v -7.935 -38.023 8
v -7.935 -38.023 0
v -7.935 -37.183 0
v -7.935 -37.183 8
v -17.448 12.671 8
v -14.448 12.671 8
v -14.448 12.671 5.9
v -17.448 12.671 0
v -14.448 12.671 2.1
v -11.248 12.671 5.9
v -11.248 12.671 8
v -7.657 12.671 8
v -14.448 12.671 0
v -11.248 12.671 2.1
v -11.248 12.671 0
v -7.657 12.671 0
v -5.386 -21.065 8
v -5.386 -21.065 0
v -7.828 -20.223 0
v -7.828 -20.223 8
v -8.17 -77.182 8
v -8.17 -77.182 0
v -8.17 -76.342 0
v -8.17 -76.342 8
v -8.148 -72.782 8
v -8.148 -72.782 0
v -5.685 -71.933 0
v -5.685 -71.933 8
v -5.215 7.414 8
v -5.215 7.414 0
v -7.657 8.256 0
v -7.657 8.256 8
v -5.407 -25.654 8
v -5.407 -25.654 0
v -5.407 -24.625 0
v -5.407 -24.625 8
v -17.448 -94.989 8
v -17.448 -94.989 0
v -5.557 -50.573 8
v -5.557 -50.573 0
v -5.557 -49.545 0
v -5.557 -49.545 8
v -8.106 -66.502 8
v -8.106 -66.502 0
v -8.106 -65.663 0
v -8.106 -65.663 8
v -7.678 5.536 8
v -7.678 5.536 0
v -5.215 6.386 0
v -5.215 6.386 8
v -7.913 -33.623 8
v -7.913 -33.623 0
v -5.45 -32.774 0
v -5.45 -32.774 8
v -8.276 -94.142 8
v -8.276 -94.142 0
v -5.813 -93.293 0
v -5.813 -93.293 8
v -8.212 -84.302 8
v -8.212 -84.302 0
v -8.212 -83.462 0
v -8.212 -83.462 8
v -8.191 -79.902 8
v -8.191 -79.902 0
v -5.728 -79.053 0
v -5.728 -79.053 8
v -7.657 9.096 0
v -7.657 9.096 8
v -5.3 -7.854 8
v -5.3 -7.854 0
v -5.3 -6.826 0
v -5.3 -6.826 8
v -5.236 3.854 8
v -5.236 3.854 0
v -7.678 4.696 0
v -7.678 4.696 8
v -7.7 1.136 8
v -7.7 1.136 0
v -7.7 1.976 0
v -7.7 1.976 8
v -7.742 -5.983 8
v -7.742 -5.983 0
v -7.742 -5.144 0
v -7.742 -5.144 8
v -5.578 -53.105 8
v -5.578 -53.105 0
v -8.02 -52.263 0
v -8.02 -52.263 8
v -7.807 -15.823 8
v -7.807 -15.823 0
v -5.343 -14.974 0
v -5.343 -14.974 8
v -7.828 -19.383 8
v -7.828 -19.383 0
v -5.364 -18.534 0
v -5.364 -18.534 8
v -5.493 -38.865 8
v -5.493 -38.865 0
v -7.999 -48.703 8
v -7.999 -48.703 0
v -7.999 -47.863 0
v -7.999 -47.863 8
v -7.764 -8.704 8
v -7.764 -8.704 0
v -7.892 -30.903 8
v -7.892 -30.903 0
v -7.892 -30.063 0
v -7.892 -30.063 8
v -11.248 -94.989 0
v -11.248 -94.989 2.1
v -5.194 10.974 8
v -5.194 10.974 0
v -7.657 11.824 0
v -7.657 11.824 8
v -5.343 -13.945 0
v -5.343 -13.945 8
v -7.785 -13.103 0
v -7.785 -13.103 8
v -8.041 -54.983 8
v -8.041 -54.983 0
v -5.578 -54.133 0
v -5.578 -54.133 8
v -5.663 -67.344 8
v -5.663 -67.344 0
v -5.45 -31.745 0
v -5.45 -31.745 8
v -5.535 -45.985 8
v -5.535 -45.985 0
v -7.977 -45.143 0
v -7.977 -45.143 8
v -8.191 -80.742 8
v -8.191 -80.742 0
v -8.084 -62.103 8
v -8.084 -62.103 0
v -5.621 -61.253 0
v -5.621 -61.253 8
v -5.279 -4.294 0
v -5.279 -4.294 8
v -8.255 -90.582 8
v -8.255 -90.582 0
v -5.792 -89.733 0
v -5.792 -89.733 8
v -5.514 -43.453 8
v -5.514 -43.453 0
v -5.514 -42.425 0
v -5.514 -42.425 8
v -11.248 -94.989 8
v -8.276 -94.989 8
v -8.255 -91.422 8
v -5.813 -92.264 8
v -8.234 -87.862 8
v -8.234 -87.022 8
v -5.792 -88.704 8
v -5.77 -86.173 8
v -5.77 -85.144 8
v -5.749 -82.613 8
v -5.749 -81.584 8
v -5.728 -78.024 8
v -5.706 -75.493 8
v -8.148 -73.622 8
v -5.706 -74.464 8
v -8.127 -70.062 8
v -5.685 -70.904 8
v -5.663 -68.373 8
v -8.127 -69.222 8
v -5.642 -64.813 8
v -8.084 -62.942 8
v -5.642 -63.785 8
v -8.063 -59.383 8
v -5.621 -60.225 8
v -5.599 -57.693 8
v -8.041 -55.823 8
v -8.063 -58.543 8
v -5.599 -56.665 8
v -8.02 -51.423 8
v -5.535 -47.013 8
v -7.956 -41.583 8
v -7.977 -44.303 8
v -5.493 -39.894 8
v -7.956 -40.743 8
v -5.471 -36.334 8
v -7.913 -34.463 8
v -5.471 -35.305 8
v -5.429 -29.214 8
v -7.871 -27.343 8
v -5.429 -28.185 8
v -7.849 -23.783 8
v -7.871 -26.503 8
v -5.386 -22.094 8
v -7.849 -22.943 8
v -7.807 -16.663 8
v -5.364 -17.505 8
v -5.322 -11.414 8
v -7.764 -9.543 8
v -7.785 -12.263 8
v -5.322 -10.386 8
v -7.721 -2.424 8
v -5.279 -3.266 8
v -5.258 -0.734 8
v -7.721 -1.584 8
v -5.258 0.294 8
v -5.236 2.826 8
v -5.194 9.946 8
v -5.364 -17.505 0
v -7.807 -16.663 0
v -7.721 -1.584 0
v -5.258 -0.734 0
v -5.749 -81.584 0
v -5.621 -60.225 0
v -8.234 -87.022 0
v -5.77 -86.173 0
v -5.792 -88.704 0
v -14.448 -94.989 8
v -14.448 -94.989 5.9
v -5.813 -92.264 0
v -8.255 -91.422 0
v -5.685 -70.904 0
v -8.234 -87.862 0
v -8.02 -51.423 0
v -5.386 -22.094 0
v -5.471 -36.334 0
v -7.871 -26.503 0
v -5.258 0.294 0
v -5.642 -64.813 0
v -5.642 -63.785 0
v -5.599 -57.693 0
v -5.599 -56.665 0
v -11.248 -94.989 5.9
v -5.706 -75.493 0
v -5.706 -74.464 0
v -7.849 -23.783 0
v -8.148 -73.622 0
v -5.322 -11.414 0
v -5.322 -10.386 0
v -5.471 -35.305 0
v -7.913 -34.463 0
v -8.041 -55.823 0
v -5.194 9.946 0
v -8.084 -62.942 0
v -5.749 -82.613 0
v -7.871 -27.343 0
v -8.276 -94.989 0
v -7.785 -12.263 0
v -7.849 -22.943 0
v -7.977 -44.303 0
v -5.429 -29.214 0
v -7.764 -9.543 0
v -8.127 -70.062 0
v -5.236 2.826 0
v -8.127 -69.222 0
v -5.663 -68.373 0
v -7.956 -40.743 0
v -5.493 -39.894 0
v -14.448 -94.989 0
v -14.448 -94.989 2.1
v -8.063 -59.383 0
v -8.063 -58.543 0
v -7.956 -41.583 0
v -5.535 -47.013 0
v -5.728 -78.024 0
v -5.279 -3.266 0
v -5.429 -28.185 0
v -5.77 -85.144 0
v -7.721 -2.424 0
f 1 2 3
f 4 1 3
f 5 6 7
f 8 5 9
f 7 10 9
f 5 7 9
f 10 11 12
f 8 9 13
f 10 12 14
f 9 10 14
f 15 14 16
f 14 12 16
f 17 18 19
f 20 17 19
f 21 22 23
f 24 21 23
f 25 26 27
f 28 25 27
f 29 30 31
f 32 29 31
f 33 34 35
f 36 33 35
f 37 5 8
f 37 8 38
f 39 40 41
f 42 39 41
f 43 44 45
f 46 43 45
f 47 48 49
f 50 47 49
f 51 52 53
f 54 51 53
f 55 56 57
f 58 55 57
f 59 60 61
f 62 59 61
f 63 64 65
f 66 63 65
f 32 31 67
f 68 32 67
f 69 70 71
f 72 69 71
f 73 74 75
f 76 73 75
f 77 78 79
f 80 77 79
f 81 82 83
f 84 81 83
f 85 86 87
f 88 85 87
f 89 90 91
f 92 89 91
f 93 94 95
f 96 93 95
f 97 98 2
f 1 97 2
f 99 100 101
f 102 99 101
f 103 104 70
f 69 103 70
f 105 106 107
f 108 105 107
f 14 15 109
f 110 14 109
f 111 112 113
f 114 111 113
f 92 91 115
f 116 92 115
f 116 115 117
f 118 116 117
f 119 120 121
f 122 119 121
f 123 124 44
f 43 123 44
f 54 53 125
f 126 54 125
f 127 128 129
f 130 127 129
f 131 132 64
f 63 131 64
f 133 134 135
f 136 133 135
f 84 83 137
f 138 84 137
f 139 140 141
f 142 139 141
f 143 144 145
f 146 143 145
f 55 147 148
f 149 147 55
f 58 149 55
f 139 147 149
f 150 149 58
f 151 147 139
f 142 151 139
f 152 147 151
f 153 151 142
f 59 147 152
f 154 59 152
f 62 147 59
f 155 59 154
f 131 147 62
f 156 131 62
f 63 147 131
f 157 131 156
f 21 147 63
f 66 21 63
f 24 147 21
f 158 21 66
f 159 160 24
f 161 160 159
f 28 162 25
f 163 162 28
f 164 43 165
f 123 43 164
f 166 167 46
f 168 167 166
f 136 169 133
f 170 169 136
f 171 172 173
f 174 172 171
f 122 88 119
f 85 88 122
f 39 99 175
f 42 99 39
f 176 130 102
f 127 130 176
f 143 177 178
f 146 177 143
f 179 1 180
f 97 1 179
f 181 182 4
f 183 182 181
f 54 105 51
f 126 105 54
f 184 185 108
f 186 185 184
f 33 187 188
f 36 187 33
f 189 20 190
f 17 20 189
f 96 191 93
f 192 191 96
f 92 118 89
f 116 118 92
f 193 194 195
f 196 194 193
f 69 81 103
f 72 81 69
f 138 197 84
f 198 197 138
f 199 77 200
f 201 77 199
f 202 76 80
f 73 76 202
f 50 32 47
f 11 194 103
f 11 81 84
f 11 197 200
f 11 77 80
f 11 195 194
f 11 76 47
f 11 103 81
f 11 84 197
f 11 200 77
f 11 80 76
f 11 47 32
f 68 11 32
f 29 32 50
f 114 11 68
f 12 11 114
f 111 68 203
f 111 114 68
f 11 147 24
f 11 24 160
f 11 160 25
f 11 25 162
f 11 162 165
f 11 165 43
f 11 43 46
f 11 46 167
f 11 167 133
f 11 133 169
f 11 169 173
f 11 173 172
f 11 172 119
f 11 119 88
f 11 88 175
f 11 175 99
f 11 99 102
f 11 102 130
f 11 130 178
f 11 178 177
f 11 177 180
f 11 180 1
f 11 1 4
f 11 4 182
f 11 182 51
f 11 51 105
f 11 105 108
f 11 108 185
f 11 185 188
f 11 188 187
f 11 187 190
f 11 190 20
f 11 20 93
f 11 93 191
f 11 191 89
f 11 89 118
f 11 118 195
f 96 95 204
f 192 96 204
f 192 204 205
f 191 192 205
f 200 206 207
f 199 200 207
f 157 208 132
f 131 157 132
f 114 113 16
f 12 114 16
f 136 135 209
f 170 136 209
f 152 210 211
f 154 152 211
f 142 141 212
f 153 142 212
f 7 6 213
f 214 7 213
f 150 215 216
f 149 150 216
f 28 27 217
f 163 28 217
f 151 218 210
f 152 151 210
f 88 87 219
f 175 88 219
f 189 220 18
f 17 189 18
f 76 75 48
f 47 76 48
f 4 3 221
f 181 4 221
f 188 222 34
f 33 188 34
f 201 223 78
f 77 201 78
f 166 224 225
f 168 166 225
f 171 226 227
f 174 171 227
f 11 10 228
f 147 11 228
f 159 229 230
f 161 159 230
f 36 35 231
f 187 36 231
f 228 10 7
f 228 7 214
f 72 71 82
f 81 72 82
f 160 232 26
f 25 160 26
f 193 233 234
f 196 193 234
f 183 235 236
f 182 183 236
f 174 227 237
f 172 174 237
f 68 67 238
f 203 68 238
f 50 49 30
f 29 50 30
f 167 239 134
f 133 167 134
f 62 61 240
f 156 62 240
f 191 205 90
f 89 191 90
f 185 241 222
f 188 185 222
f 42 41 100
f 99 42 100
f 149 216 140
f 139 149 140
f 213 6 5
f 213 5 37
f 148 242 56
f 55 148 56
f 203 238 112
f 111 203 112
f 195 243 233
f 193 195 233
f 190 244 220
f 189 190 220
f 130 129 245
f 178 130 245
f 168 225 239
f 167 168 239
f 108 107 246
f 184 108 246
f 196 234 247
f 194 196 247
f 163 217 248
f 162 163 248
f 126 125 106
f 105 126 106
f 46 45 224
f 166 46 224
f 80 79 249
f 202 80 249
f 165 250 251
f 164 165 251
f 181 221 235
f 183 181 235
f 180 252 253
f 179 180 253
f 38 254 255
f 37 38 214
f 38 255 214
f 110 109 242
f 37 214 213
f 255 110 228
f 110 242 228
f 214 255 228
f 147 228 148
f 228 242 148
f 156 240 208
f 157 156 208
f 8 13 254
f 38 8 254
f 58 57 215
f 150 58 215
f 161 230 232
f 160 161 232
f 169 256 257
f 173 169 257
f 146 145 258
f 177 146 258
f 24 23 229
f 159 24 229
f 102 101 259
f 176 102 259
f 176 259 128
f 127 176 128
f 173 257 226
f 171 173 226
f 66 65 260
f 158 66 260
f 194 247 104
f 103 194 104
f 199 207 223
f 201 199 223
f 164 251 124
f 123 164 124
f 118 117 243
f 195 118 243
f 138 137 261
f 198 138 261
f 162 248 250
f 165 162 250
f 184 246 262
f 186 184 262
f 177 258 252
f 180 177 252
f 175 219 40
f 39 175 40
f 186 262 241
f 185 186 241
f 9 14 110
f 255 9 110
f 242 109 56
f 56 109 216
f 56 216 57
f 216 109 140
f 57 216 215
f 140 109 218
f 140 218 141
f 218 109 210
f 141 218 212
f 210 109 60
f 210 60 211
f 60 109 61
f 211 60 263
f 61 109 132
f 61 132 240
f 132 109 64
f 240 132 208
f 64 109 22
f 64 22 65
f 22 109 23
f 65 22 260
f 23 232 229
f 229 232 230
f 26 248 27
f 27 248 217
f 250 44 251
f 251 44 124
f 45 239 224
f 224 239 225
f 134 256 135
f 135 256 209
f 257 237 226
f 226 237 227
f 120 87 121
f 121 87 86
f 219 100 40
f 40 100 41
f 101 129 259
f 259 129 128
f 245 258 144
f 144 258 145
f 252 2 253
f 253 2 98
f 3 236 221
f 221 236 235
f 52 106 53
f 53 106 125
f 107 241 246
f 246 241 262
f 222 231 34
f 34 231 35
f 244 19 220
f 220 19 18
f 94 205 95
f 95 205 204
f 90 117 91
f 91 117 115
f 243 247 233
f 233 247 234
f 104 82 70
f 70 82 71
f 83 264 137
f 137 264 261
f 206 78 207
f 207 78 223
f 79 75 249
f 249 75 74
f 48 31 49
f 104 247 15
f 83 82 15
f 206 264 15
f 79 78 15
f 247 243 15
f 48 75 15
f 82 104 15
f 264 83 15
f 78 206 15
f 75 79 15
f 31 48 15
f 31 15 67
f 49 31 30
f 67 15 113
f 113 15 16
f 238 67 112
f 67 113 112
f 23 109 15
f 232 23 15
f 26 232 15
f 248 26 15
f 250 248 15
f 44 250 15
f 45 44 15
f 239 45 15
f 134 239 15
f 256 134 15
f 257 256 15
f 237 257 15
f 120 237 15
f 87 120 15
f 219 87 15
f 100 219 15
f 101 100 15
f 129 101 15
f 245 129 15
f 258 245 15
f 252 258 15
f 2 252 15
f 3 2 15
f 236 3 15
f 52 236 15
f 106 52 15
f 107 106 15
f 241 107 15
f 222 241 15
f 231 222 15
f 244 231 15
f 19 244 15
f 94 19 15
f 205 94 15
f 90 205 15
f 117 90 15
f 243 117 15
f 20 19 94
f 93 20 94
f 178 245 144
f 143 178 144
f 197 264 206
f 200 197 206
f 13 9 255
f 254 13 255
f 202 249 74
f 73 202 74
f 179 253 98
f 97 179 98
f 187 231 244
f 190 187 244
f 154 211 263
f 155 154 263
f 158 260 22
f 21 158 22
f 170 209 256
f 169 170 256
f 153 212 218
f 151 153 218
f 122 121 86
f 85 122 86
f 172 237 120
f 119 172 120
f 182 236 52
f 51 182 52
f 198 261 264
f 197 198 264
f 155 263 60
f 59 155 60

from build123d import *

# Parameters (mm, degrees)
F1_DEPTH = 8
F2_W     = 107.659508
F2_H     = 3.8
F3_DEPTH = 3.2
F4_W     = 107.659508
F4_H     = 2.1
F4_H_2   = 3.8
F5_DEPTH = 3


with BuildPart() as f1:
    # F0 (on Top) → F1 (new body)
    with BuildSketch(Plane.XY):
        Polygon((-7.657052, 11.823565), (-7.657052, 12.67053), (-11.247598, 12.67053), (-11.247598, -94.988978), (-8.276437, -94.988978), (-8.276437, -94.142013), (-5.812997, -93.292553), (-5.812997, -92.264038), (-8.255079, -91.421942), (-8.255079, -90.582077), (-5.791639, -89.732617), (-5.791639, -88.704102), (-8.233721, -87.862006), (-8.233721, -87.022141), (-5.770281, -86.172681), (-5.770281, -85.144166), (-8.212363, -84.30207), (-8.212363, -83.462205), (-5.748923, -82.612745), (-5.748923, -81.58423), (-8.191005, -80.742134), (-8.191005, -79.902269), (-5.727564, -79.052809), (-5.727564, -78.024294), (-8.169647, -77.182198), (-8.169647, -76.342334), (-5.706206, -75.492873), (-5.706206, -74.464358), (-8.148289, -73.622263), (-8.148289, -72.782398), (-5.684848, -71.932937), (-5.684848, -70.904422), (-8.126931, -70.062327), (-8.126931, -69.222462), (-5.66349, -68.373001), (-5.66349, -67.344486), (-8.105573, -66.502391), (-8.105573, -65.662526), (-5.642132, -64.813066), (-5.642132, -63.78455), (-8.084214, -62.942455), (-8.084214, -62.10259), (-5.620774, -61.25313), (-5.620774, -60.224614), (-8.062856, -59.382519), (-8.062856, -58.542654), (-5.599416, -57.693194), (-5.599416, -56.664678), (-8.041498, -55.822583), (-8.041498, -54.982718), (-5.578058, -54.133258), (-5.578058, -53.104742), (-8.02014, -52.262647), (-8.02014, -51.422782), (-5.5567, -50.573322), (-5.5567, -49.544806), (-7.998782, -48.702711), (-7.998782, -47.862846), (-5.535342, -47.013386), (-5.535342, -45.98487), (-7.977424, -45.142775), (-7.977424, -44.30291), (-5.513984, -43.45345), (-5.513984, -42.424935), (-7.956066, -41.582839), (-7.956066, -40.742974), (-5.492625, -39.893514), (-5.492625, -38.864999), (-7.934708, -38.022903), (-7.934708, -37.183038), (-5.471267, -36.333578), (-5.471267, -35.305063), (-7.91335, -34.462967), (-7.91335, -33.623102), (-5.449909, -32.773642), (-5.449909, -31.745127), (-7.891992, -30.903031), (-7.891992, -30.063166), (-5.428551, -29.213706), (-5.428551, -28.185191), (-7.870633, -27.343095), (-7.870633, -26.503231), (-5.407193, -25.65377), (-5.407193, -24.625255), (-7.849275, -23.783159), (-7.849275, -22.943295), (-5.385835, -22.093834), (-5.385835, -21.065319), (-7.827917, -20.223224), (-7.827917, -19.383359), (-5.364477, -18.533898), (-5.364477, -17.505383), (-7.806559, -16.663288), (-7.806559, -15.823423), (-5.343119, -14.973962), (-5.343119, -13.945447), (-7.785201, -13.103352), (-7.785201, -12.263487), (-5.321761, -11.414027), (-5.321761, -10.385511), (-7.763843, -9.543416), (-7.763843, -8.703551), (-5.300403, -7.854091), (-5.300403, -6.825575), (-7.742485, -5.98348), (-7.742485, -5.143615), (-5.279044, -4.294155), (-5.279044, -3.265639), (-7.721127, -2.423544), (-7.721127, -1.583679), (-5.257686, -0.734219), (-5.257686, 0.294297), (-7.699769, 1.136392), (-7.699769, 1.976257), (-5.236328, 2.825717), (-5.236328, 3.854233), (-7.678411, 4.696328), (-7.678411, 5.536193), (-5.21497, 6.385653), (-5.21497, 7.414169), (-7.657052, 8.256264), (-7.657052, 9.096129), (-5.193612, 9.945589), (-5.193612, 10.974104), align=None)
    extrude(amount=F1_DEPTH)

    # F2 (on face) → F3 (join)
    with BuildSketch(Plane(origin=(-11.247598, 0, 0), x_dir=(0, -1, 0), z_dir=(-1, 0, 0))):
        with Locations((41.159224, 4)):
            Rectangle(F2_W, F2_H)
    extrude(amount=F3_DEPTH)

    # F4 (on face) → F5 (join)
    with BuildSketch(Plane(origin=(-14.447598, 0, 0), x_dir=(0, -1, 0), z_dir=(-1, 0, 0))):
        with Locations((41.159224, 6.95)):
            Rectangle(F4_W, F4_H)
        with Locations((41.159224, 4)):
            Rectangle(F4_W, F4_H_2)
        with Locations((41.159224, 1.05)):
            Rectangle(F4_W, F4_H)
    extrude(amount=F5_DEPTH)


solid = f1.part
